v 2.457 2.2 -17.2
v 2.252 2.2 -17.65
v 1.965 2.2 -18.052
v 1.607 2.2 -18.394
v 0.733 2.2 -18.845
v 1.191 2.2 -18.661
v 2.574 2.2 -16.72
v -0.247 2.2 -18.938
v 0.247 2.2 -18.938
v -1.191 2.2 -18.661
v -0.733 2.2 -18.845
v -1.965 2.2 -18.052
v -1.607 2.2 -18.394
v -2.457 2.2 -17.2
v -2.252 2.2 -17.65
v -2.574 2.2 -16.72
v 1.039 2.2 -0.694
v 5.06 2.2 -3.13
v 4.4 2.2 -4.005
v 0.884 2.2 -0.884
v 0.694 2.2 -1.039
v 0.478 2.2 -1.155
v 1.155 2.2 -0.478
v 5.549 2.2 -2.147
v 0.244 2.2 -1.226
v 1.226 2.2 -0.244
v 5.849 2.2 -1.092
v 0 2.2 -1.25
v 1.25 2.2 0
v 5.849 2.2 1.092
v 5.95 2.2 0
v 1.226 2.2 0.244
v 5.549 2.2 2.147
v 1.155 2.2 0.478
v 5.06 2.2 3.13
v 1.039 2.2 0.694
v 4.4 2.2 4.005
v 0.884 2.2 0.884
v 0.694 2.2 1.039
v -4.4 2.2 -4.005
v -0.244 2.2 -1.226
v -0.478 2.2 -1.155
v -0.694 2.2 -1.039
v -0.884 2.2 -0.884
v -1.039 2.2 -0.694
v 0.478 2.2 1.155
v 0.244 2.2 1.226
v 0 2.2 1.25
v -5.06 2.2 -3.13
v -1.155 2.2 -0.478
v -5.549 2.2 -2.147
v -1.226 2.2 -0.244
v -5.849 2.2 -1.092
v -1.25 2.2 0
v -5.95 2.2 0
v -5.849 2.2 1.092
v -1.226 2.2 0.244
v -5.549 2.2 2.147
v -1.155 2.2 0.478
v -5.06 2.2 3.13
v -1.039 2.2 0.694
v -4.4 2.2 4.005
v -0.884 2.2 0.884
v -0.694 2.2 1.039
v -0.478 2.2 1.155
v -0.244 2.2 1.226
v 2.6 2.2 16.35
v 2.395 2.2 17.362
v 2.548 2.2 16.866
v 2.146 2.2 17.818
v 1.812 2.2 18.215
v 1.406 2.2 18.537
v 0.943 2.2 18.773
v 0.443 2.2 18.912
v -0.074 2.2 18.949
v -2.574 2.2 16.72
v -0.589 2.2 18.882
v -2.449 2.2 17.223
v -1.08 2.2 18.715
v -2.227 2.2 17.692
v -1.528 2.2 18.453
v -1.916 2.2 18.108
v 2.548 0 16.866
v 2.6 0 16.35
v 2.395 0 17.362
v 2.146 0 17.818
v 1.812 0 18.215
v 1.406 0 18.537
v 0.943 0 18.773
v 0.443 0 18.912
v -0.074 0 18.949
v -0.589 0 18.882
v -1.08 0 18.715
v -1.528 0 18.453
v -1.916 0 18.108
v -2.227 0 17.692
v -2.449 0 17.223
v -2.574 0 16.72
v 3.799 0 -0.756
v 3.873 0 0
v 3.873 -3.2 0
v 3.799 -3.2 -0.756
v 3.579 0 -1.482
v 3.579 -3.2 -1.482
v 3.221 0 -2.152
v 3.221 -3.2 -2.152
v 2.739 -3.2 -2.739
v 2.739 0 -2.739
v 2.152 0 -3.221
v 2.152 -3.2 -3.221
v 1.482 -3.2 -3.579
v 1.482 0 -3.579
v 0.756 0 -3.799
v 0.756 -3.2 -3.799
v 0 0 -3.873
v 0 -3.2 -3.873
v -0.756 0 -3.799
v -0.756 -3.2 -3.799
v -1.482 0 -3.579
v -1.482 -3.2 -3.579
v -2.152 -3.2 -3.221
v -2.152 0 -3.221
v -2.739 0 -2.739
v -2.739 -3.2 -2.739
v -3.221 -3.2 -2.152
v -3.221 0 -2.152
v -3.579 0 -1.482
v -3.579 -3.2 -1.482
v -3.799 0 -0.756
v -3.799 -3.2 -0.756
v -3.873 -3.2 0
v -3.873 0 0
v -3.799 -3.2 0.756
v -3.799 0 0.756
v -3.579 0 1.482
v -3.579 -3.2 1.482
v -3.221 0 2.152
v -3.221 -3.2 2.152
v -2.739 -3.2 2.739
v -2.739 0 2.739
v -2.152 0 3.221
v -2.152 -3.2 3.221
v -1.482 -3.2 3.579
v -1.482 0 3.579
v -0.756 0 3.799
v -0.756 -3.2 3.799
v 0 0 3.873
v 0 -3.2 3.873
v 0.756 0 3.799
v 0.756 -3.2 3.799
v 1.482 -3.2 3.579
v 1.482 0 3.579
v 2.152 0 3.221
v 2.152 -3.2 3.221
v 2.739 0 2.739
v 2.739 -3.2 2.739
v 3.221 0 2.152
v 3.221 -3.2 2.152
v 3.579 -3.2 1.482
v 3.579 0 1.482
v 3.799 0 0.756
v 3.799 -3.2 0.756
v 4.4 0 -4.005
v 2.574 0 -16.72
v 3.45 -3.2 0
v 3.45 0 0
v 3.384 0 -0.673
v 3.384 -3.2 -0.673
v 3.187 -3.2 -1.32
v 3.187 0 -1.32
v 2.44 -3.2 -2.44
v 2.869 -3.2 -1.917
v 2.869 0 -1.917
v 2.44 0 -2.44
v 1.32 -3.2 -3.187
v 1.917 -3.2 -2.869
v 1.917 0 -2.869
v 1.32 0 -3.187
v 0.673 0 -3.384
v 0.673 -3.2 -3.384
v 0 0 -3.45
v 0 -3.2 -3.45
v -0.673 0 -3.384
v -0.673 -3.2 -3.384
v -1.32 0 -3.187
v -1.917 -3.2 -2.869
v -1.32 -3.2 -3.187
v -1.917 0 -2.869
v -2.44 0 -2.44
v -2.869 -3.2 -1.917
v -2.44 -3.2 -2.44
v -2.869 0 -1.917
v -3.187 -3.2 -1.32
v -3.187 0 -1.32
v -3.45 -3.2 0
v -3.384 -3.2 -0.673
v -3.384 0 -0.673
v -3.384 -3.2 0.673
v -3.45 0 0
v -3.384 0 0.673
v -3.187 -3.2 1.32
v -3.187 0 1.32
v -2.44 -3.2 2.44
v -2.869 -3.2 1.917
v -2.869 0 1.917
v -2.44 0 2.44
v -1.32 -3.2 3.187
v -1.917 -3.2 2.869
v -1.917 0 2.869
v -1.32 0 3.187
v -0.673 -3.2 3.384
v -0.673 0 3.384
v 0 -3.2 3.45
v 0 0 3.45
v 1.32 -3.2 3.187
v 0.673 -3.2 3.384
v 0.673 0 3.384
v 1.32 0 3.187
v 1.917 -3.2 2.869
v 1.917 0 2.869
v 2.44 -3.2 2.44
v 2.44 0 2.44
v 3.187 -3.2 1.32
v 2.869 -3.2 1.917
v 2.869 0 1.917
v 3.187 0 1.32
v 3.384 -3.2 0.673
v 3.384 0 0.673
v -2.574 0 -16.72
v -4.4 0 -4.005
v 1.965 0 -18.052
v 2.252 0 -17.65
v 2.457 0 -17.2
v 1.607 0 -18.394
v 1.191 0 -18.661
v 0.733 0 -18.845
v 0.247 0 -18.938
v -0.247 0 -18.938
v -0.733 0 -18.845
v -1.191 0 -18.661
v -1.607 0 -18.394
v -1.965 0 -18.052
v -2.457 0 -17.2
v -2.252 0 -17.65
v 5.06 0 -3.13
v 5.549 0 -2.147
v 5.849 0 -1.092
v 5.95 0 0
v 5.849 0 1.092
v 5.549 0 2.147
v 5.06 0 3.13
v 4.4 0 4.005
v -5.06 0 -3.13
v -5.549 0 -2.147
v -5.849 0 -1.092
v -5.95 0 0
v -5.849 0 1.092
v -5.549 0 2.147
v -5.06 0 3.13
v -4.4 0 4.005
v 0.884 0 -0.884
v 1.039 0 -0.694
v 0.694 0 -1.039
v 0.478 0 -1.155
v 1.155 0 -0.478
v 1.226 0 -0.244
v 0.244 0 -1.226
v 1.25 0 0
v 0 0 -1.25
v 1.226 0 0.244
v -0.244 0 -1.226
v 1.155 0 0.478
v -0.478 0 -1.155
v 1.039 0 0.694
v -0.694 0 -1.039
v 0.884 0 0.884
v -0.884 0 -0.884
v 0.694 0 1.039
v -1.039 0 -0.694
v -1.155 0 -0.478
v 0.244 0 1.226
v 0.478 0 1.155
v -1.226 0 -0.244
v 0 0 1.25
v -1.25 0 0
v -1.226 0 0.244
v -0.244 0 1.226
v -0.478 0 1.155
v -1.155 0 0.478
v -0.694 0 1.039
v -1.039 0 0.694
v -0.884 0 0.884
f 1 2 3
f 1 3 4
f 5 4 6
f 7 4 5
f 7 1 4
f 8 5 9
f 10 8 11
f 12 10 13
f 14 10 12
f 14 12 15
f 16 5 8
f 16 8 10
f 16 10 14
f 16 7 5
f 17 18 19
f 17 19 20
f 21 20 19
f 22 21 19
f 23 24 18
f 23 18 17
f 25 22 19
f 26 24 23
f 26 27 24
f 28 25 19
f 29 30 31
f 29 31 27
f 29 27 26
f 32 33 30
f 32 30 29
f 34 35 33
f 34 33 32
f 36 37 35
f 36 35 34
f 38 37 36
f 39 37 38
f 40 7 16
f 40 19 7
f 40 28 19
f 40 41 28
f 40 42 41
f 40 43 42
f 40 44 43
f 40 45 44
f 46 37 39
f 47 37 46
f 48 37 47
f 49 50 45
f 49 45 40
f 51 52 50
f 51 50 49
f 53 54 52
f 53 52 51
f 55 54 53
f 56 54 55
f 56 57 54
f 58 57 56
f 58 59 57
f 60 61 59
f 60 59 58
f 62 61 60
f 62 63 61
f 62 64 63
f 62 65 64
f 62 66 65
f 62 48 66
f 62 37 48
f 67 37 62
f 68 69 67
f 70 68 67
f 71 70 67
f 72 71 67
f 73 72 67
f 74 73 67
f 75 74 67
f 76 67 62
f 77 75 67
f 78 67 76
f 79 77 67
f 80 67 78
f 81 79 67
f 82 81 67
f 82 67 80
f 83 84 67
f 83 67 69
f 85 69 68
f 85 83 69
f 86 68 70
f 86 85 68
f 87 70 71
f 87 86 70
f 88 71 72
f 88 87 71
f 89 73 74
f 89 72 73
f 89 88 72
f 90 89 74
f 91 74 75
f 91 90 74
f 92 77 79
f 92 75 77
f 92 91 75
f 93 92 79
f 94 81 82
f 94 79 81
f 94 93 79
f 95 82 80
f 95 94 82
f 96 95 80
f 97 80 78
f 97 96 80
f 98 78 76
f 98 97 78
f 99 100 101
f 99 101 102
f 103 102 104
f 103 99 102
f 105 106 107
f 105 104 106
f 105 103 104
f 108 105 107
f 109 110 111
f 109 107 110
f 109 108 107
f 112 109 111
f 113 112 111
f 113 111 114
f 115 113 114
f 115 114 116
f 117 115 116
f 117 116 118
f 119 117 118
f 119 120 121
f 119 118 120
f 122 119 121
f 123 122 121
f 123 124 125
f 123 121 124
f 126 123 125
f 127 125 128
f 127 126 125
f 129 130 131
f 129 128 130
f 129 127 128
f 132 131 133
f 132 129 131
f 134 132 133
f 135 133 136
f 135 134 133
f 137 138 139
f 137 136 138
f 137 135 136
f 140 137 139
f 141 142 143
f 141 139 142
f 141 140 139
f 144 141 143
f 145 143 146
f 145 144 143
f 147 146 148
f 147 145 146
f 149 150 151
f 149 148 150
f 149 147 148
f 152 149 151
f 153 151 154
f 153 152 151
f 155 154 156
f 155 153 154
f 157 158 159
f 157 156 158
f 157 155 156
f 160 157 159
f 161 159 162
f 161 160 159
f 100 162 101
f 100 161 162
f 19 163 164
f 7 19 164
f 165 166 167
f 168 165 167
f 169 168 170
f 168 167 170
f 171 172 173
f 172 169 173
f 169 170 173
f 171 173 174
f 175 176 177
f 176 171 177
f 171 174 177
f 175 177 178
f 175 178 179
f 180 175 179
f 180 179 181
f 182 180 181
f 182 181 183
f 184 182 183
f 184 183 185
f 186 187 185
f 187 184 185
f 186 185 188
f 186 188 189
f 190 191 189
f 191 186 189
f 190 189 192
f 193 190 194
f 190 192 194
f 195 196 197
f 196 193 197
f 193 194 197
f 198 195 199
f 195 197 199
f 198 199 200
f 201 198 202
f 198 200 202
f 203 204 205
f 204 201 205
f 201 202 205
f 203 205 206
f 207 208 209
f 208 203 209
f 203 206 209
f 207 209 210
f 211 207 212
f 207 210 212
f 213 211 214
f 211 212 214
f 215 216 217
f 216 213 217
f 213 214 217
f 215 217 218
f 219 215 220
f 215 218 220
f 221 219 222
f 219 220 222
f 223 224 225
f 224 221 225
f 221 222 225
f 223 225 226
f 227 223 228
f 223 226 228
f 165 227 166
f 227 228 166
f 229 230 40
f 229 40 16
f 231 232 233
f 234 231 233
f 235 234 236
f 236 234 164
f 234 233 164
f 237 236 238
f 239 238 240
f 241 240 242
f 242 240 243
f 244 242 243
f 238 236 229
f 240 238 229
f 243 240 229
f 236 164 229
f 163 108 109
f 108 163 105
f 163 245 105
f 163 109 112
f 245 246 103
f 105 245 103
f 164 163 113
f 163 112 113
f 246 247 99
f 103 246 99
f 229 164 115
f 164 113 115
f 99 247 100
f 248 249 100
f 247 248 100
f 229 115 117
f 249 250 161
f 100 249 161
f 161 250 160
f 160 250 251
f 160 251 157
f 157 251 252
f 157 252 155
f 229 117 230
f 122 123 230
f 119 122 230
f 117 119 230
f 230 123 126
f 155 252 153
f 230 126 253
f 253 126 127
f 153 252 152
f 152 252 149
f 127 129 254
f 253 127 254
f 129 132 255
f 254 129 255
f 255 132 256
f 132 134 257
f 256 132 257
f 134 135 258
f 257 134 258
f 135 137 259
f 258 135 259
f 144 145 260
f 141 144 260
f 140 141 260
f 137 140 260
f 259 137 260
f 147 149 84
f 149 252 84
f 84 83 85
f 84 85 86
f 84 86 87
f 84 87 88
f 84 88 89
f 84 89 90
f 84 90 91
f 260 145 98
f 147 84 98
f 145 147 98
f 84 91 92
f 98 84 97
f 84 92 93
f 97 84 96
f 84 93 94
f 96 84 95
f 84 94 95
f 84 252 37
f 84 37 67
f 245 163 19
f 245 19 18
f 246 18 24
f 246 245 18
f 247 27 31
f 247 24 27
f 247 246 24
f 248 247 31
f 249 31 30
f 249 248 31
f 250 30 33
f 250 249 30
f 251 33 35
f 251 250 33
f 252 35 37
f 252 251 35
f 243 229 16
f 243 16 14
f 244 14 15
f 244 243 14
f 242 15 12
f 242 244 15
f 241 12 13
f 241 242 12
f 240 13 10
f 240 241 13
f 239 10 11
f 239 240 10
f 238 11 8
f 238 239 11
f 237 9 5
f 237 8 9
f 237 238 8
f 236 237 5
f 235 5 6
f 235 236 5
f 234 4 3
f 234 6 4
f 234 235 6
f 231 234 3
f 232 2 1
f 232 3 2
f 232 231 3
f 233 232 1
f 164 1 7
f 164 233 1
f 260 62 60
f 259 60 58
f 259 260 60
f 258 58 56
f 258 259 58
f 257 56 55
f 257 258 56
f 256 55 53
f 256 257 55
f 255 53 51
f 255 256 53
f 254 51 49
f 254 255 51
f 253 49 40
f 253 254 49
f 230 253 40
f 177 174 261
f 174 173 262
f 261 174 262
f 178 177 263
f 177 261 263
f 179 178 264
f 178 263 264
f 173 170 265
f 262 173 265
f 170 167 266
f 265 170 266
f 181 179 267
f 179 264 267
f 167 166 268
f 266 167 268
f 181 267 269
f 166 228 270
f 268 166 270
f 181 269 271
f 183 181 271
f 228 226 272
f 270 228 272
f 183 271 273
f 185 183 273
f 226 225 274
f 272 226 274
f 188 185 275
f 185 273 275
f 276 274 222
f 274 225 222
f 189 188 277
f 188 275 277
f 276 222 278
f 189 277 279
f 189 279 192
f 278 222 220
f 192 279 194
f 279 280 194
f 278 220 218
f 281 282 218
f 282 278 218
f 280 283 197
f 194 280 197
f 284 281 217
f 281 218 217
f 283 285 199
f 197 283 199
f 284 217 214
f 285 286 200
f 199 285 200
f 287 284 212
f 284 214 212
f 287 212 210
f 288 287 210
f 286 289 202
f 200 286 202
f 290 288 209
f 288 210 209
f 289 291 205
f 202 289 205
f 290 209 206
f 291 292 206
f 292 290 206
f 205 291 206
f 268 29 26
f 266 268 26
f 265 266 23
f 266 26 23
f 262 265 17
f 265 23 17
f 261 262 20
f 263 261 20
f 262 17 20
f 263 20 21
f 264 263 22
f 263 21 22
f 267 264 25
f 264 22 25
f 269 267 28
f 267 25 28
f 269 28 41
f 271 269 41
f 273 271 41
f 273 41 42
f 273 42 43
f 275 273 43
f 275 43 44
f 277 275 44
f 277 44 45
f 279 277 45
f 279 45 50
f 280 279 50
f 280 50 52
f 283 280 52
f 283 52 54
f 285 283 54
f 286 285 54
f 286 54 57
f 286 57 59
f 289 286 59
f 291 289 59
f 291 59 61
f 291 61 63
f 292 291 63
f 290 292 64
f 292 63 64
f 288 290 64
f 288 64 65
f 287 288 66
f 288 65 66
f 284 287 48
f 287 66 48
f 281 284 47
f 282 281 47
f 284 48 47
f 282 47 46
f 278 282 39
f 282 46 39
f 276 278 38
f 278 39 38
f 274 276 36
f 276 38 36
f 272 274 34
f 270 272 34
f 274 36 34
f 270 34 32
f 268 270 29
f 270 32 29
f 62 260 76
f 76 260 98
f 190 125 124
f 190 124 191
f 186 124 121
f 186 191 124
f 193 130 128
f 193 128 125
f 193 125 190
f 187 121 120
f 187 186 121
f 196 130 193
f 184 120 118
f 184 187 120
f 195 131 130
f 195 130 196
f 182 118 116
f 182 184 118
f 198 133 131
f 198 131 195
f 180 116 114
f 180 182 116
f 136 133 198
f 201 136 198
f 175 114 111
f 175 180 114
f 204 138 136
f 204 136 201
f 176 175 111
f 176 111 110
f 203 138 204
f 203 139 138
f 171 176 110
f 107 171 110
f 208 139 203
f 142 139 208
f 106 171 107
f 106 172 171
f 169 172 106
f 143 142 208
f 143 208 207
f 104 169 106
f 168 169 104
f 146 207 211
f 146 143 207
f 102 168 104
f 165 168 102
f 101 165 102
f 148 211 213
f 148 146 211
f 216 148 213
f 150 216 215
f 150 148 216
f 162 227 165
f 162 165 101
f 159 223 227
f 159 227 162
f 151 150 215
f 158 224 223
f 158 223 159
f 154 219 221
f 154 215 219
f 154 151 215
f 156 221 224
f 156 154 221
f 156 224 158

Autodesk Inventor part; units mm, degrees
ref_plane "YZ Plane" through (0, 0, 0) normal (1, 0, 0) x (0, 1, 0)
ref_plane "XZ Plane" through (0, 0, 0) normal (0, 1, 0) x (-1, 0, 0)
ref_plane "XY Plane" through (0, 0, 0) normal (0, 0, 1) x (1, 0, 0)
sketch "Sketch1" plane through (0, 0, 0) normal (0, 1, 0) x (-1, 0, 0)
  circle A0 centre (0, 0) radius 5.95
  circle A1 centre (0, -16.35) radius 2.6
  line L0 (4.4, -4.0053) -> (2.5736, -16.7197)
  circle A2 centre (0, 16.35) radius 2.6
  line L1 (4.4, 4.0053) -> (2.5736, 16.7197)
  line L2 (-4.4, 4.0053) -> (-2.6, 16.35)
  line L3 (-4.4, -4.0053) -> (-2.5736, -16.7197)
  dimension "d0" = 11.9
  dimension "d1" = 5.2
  dimension "d2" = 4.4
  dimension "d3" = 5.2
  dimension "d4" = 16.35
  dimension "d5" = 16.35
  dimension "d6" = 4.4
  dimension "d7" = 4.4
  dimension "d8" = 4.4
  dimension "d9" = 0
extrude "Extrusion1" add sketch "Sketch1" along normal blind 2.2
sketch "Sketch2" plane through (0, 0, 0) normal (0, -1, 0) x (1, 0, 0)
  circle A0 centre (0, 0) radius 3.8734
  circle A1 centre (0, 0) radius 3.45
  dimension "d12" = 6.9
extrude "Extrusion2" add sketch "Sketch2" along normal blind 3.2
sketch "Sketch3" plane through (0, 2.2, 0) normal (0, 1, 0) x (1, 0, 0)
  circle A0 centre (0, 0) radius 1.25
  dimension "d15" = 2.5
extrude "Extrusion3" cut sketch "Sketch3" against normal blind 2.2
properties part number "servo_attach"
